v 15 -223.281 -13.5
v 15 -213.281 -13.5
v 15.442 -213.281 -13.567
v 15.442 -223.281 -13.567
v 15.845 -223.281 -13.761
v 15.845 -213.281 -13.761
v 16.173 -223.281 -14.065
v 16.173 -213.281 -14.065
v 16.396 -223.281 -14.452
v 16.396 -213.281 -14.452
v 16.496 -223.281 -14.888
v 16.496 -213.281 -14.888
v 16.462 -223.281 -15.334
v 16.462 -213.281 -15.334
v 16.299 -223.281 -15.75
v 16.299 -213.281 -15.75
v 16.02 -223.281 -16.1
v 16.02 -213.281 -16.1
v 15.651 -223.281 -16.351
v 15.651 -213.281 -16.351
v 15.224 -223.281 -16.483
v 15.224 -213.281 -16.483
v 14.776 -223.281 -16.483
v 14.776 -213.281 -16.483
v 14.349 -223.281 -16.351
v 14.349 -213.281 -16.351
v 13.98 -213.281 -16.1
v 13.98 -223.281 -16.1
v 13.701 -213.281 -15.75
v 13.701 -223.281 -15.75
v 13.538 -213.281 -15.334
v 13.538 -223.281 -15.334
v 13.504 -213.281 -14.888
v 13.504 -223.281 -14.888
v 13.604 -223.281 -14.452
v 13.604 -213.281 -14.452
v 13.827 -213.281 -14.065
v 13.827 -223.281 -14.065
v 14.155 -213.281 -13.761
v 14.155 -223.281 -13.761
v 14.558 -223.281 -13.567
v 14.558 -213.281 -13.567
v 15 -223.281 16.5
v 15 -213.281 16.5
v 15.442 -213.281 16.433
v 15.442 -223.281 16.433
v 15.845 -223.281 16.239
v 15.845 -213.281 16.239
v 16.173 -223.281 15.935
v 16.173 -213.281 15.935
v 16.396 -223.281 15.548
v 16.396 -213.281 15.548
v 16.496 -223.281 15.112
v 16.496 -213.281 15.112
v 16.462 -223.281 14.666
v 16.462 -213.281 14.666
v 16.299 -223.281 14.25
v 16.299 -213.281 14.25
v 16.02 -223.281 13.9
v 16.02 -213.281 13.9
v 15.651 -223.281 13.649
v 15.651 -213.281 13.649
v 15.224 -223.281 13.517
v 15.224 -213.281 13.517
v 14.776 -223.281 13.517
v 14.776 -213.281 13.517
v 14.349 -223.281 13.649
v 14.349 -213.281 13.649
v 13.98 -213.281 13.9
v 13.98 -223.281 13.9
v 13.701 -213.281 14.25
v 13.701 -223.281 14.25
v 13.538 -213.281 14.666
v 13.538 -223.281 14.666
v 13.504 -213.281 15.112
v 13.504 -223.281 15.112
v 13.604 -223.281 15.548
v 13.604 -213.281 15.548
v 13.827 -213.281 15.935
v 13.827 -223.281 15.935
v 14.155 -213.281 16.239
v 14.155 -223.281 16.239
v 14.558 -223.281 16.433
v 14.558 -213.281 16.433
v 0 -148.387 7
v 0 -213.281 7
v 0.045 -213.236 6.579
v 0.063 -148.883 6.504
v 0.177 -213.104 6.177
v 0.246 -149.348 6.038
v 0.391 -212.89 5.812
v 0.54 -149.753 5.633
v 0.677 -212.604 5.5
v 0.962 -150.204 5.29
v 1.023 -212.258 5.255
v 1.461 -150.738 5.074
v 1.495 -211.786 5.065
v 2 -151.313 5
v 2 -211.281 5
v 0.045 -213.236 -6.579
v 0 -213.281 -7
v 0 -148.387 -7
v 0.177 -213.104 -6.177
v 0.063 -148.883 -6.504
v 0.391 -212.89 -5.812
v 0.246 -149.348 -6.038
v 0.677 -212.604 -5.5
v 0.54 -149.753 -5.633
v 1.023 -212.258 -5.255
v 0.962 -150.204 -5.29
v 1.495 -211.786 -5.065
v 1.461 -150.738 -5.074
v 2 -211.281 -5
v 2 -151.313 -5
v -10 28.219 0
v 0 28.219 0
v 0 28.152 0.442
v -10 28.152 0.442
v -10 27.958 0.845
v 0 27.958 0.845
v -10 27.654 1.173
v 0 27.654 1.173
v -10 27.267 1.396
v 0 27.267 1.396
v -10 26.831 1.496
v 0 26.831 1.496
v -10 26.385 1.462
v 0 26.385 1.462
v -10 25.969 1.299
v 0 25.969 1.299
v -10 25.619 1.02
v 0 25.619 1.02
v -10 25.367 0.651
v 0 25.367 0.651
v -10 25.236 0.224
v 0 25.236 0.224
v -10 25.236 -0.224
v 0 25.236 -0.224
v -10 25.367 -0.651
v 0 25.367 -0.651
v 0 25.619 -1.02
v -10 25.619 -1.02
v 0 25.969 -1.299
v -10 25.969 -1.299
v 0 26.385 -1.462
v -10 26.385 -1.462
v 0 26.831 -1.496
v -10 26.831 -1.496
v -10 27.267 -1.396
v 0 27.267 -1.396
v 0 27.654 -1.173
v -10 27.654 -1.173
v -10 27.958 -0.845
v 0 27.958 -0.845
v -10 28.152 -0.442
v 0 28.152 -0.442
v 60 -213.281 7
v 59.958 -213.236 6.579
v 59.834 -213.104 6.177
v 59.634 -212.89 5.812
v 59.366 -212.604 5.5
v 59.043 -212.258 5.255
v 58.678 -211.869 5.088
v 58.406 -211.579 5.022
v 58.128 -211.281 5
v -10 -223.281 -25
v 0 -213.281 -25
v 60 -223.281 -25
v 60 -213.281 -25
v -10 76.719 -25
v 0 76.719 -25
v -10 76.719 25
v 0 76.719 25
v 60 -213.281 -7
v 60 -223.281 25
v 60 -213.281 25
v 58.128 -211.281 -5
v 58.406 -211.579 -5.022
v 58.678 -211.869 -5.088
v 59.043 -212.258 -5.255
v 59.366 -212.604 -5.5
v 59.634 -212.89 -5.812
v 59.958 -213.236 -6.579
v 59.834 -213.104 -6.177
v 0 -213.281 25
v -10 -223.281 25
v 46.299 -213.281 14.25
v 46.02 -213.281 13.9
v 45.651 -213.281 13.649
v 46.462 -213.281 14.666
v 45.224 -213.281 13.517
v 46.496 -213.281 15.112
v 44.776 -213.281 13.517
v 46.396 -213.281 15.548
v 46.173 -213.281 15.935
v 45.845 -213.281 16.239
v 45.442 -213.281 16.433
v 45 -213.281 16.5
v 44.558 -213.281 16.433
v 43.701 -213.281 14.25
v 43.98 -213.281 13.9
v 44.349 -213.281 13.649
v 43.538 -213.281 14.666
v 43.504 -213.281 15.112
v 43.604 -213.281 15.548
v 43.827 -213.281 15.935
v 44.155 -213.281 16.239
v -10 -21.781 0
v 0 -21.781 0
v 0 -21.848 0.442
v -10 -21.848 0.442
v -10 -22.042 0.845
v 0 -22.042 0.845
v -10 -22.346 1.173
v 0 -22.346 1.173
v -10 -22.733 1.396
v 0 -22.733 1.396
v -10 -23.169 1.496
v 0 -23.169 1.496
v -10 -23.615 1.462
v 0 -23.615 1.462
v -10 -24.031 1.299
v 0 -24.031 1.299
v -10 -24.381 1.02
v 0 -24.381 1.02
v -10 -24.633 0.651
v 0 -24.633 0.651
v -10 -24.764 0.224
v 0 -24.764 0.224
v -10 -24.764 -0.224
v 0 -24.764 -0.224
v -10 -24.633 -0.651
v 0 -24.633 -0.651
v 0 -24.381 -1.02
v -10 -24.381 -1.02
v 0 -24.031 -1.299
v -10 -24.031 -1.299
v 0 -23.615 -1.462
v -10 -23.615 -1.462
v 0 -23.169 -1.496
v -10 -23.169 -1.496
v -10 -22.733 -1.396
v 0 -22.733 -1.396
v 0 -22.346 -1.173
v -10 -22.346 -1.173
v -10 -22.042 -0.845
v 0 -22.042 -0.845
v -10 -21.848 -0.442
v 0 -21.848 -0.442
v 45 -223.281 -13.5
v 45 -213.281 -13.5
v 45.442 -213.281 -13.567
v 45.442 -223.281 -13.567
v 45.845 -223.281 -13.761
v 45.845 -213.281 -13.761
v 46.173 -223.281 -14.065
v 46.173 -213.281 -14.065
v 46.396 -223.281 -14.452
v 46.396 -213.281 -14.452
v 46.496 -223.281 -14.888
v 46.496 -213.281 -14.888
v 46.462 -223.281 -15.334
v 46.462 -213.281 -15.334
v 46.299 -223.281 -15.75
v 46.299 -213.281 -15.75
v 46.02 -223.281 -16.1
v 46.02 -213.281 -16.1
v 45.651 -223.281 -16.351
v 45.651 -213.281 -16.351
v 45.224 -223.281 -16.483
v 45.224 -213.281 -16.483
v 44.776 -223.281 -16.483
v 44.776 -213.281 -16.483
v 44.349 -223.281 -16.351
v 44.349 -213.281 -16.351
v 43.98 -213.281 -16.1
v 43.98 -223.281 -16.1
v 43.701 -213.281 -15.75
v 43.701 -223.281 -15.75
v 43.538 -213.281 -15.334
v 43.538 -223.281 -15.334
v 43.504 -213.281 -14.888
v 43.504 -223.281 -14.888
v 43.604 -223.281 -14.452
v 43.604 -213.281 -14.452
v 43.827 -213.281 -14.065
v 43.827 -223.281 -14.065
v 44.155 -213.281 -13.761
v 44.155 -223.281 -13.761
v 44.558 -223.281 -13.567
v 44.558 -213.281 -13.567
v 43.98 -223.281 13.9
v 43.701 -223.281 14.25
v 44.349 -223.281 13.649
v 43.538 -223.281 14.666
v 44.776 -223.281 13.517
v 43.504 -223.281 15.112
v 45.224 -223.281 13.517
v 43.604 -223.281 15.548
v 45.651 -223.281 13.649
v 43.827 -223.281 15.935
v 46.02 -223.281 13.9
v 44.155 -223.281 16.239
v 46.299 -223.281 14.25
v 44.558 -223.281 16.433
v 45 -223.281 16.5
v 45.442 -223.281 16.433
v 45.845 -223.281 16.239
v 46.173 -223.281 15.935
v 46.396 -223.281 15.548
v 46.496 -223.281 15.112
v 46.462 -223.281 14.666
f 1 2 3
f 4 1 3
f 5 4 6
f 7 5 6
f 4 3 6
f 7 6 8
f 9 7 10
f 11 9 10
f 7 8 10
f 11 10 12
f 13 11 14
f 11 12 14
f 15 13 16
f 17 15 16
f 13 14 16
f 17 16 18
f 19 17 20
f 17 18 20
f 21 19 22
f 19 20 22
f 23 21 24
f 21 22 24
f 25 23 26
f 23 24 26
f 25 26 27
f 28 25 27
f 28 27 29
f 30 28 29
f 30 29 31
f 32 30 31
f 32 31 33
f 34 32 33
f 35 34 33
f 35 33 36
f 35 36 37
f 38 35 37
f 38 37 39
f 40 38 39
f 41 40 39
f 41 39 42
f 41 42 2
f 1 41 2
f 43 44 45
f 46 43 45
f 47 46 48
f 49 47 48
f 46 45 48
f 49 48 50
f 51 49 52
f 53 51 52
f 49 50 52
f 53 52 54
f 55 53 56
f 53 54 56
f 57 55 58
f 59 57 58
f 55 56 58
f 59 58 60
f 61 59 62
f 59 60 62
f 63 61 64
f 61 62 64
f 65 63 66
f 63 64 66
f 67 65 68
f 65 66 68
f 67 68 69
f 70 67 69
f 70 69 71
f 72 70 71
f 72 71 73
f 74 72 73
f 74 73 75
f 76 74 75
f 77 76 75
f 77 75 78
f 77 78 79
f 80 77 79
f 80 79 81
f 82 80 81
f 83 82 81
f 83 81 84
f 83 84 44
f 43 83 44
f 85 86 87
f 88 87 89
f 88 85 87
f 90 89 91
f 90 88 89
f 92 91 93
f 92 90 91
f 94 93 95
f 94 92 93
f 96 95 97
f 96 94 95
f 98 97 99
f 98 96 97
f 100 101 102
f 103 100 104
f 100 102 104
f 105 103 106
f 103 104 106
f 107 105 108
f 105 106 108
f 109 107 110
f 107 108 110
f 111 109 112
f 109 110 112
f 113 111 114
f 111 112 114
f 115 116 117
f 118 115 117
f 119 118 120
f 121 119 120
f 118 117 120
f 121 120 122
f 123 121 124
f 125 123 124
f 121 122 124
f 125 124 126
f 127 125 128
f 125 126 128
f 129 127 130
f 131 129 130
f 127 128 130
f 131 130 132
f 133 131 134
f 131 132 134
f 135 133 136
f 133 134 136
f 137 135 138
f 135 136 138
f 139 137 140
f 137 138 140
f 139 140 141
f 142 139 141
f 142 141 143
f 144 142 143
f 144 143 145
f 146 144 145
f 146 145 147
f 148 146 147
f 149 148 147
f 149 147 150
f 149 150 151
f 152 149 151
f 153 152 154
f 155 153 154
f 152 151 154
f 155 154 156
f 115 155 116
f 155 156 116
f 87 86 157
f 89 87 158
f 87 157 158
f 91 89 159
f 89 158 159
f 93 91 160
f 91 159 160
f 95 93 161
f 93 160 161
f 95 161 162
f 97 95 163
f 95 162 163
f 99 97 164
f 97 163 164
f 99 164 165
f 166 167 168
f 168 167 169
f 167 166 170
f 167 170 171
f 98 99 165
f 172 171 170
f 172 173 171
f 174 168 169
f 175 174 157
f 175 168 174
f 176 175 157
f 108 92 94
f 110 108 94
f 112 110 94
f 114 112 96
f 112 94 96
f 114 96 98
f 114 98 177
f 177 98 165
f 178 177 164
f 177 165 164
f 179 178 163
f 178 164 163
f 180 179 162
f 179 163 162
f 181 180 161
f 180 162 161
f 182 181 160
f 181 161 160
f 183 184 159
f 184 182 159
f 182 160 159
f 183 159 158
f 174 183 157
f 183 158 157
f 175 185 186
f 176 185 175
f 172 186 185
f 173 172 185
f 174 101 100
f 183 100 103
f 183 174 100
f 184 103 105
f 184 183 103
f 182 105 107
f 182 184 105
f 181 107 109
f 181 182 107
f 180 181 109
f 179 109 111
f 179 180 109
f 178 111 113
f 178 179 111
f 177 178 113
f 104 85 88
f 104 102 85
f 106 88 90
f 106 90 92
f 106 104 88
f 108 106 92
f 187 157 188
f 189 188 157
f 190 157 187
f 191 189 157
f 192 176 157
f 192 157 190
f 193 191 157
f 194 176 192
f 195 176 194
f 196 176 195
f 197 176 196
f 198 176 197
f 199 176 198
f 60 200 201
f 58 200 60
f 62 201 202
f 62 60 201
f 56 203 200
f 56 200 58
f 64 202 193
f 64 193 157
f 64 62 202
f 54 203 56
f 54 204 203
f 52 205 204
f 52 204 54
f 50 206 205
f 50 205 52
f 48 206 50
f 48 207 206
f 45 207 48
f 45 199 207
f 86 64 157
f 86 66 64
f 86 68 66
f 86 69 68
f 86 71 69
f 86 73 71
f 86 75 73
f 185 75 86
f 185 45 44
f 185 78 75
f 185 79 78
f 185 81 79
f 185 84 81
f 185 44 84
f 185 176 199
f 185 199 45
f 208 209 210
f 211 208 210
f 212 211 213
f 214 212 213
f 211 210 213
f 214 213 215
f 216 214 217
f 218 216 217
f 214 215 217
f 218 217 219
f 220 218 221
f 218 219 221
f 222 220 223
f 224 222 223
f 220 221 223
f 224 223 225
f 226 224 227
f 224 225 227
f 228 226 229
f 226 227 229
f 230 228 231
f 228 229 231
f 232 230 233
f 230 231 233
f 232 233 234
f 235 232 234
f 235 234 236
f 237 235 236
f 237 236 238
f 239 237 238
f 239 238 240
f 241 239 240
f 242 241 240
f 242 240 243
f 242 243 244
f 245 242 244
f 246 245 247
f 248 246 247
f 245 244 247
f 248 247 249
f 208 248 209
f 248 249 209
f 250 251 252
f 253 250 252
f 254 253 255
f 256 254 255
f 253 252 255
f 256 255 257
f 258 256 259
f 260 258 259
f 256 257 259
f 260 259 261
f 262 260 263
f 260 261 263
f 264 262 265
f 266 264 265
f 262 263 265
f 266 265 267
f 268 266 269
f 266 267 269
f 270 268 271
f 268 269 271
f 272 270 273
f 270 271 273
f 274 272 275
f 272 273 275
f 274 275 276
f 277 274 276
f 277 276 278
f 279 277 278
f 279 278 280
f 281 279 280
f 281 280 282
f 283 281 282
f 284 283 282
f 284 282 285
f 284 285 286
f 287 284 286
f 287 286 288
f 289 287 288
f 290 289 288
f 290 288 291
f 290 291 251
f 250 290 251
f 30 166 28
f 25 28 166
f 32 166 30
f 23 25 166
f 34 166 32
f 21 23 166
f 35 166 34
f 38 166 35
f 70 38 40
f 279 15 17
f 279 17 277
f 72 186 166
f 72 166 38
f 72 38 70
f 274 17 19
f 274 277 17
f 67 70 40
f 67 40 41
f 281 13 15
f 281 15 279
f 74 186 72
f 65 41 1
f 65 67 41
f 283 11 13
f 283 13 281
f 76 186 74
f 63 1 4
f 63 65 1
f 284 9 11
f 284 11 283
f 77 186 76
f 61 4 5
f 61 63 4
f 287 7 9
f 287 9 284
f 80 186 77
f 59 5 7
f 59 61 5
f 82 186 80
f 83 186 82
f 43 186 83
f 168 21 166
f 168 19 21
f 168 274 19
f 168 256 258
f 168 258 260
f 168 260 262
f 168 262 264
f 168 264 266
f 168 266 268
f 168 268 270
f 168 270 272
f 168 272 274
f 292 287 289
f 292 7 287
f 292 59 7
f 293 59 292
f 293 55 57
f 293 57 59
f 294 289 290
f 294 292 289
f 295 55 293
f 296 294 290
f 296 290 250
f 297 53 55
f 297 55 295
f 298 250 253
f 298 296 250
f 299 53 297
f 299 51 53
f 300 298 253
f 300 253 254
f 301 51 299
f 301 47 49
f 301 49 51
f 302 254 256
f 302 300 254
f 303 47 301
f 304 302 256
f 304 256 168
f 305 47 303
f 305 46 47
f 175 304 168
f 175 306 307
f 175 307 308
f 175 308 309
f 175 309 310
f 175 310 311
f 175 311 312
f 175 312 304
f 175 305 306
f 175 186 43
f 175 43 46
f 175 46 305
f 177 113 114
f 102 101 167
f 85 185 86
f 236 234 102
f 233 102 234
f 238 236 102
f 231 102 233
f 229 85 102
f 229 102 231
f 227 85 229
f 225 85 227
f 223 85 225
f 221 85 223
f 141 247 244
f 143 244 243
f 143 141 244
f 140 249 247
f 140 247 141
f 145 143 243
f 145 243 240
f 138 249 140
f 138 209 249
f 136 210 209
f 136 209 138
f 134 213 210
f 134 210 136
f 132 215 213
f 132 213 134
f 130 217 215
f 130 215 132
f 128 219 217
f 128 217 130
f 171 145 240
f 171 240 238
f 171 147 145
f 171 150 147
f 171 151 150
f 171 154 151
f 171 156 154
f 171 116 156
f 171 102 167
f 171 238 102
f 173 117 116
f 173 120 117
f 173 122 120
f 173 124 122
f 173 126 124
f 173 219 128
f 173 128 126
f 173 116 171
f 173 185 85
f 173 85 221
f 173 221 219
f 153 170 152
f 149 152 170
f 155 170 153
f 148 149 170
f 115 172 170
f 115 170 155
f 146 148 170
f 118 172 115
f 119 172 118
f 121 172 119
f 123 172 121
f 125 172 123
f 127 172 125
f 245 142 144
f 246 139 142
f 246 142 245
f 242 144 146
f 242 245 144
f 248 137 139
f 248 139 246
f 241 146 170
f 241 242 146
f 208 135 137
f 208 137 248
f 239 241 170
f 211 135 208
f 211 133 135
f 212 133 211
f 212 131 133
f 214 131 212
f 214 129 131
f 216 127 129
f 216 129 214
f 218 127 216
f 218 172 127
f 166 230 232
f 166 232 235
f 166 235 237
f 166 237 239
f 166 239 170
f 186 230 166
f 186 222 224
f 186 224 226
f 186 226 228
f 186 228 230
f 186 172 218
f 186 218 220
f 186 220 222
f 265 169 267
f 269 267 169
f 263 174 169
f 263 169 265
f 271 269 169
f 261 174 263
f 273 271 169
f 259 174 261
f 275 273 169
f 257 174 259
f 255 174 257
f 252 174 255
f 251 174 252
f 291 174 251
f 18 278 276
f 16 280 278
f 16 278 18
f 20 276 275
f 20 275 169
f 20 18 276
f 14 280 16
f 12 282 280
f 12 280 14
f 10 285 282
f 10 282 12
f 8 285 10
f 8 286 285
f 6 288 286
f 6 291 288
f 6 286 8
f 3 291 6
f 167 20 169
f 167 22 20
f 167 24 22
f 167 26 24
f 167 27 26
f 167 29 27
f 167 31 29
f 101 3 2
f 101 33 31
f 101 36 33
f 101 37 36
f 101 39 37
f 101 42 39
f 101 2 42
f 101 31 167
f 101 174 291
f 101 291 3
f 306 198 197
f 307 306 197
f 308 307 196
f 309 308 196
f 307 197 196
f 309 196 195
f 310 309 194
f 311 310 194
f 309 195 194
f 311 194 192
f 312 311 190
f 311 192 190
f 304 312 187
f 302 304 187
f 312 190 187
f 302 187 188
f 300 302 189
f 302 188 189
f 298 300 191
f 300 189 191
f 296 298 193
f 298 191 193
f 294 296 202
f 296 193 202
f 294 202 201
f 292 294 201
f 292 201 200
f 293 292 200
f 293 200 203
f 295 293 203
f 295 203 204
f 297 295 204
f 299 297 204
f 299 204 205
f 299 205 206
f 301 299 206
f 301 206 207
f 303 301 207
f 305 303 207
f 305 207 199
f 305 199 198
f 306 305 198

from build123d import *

# Parameters (mm, degrees)
BOSS_EXTRUDE1_DEPTH = 25
SKETCH2_W           = 10
SKETCH2_H           = 64.104672306
BOSS_EXTRUDE2_DEPTH = 60
CUT_EXTRUDE1_DEPTH  = 60
SKETCH4_R           = 1.5
CUT_EXTRUDE2_DEPTH  = 60
FILLET1_R           = 2
SKETCH13_R          = 1.5
CUT_EXTRUDE3_DEPTH  = 10


with BuildPart() as part:
    # Sketch1 → Boss-Extrude1 (new, symmetric)
    with BuildSketch(Plane.XY):
        Polygon((0, 76.71875), (-10, 76.71875), (-10, -223.28125), (60, -223.28125), (60, -213.28125), (0, -213.28125), align=None)
    extrude(amount=BOSS_EXTRUDE1_DEPTH, both=True)

    # Sketch2 → Boss-Extrude2 (add)
    with BuildSketch(Plane(origin=(0, 0, 0), x_dir=(0, 0, -1), z_dir=(1, 0, 0))):
        with Locations((0, -181.228913847)):
            Rectangle(SKETCH2_W, SKETCH2_H)
    extrude(amount=BOSS_EXTRUDE2_DEPTH)

    # Sketch3 → Cut-Extrude1 (cut)
    with BuildSketch(Plane.XY.offset(5)):
        Polygon((0, -149.176577694), (60, -213.28125), (60, -149.176577694), align=None)
    extrude(amount=-CUT_EXTRUDE1_DEPTH, mode=Mode.SUBTRACT)

    # Sketch4 → Cut-Extrude2 (cut)
    with BuildSketch(Plane(origin=(0, -213.28125, 0), x_dir=(1, 0, 0), z_dir=(0, 1, 0))):
        with Locations(Location((15, 15, 0), (0, 0, 270))):
            Circle(SKETCH4_R)
        with Locations(Location((15, -15, 0), (0, 0, 270))):
            Circle(SKETCH4_R)
        with Locations(Location((45, -15, 0), (0, 0, 270))):
            Circle(SKETCH4_R)
        with Locations(Location((45, 15, 0), (0, 0, 270))):
            Circle(SKETCH4_R)
    extrude(amount=-CUT_EXTRUDE2_DEPTH, mode=Mode.SUBTRACT)

    # Fillet1
    fillet1_edges = [part.edges().sort_by_distance(p)[0] for p in [
        (0, -181.228913847, 5),
        (30, -213.28125, 5),
        (0, -181.228913847, -5),
        (30, -213.28125, -5),
        (0, -149.176577694, 0),
    ]]
    fillet(fillet1_edges, radius=FILLET1_R)

    # Sketch13 → Cut-Extrude3 (cut)
    with BuildSketch(Plane(origin=(0, 0, 0), x_dir=(0, 0, -1), z_dir=(1, 0, 0))):
        with Locations(Location((0, 26.71875, 0), (0, 0, 90))):
            Circle(SKETCH13_R)
        with Locations(Location((0, -23.28125, 0), (0, 0, 90))):
            Circle(SKETCH13_R)
    extrude(amount=-CUT_EXTRUDE3_DEPTH, mode=Mode.SUBTRACT)


solid = part.part
